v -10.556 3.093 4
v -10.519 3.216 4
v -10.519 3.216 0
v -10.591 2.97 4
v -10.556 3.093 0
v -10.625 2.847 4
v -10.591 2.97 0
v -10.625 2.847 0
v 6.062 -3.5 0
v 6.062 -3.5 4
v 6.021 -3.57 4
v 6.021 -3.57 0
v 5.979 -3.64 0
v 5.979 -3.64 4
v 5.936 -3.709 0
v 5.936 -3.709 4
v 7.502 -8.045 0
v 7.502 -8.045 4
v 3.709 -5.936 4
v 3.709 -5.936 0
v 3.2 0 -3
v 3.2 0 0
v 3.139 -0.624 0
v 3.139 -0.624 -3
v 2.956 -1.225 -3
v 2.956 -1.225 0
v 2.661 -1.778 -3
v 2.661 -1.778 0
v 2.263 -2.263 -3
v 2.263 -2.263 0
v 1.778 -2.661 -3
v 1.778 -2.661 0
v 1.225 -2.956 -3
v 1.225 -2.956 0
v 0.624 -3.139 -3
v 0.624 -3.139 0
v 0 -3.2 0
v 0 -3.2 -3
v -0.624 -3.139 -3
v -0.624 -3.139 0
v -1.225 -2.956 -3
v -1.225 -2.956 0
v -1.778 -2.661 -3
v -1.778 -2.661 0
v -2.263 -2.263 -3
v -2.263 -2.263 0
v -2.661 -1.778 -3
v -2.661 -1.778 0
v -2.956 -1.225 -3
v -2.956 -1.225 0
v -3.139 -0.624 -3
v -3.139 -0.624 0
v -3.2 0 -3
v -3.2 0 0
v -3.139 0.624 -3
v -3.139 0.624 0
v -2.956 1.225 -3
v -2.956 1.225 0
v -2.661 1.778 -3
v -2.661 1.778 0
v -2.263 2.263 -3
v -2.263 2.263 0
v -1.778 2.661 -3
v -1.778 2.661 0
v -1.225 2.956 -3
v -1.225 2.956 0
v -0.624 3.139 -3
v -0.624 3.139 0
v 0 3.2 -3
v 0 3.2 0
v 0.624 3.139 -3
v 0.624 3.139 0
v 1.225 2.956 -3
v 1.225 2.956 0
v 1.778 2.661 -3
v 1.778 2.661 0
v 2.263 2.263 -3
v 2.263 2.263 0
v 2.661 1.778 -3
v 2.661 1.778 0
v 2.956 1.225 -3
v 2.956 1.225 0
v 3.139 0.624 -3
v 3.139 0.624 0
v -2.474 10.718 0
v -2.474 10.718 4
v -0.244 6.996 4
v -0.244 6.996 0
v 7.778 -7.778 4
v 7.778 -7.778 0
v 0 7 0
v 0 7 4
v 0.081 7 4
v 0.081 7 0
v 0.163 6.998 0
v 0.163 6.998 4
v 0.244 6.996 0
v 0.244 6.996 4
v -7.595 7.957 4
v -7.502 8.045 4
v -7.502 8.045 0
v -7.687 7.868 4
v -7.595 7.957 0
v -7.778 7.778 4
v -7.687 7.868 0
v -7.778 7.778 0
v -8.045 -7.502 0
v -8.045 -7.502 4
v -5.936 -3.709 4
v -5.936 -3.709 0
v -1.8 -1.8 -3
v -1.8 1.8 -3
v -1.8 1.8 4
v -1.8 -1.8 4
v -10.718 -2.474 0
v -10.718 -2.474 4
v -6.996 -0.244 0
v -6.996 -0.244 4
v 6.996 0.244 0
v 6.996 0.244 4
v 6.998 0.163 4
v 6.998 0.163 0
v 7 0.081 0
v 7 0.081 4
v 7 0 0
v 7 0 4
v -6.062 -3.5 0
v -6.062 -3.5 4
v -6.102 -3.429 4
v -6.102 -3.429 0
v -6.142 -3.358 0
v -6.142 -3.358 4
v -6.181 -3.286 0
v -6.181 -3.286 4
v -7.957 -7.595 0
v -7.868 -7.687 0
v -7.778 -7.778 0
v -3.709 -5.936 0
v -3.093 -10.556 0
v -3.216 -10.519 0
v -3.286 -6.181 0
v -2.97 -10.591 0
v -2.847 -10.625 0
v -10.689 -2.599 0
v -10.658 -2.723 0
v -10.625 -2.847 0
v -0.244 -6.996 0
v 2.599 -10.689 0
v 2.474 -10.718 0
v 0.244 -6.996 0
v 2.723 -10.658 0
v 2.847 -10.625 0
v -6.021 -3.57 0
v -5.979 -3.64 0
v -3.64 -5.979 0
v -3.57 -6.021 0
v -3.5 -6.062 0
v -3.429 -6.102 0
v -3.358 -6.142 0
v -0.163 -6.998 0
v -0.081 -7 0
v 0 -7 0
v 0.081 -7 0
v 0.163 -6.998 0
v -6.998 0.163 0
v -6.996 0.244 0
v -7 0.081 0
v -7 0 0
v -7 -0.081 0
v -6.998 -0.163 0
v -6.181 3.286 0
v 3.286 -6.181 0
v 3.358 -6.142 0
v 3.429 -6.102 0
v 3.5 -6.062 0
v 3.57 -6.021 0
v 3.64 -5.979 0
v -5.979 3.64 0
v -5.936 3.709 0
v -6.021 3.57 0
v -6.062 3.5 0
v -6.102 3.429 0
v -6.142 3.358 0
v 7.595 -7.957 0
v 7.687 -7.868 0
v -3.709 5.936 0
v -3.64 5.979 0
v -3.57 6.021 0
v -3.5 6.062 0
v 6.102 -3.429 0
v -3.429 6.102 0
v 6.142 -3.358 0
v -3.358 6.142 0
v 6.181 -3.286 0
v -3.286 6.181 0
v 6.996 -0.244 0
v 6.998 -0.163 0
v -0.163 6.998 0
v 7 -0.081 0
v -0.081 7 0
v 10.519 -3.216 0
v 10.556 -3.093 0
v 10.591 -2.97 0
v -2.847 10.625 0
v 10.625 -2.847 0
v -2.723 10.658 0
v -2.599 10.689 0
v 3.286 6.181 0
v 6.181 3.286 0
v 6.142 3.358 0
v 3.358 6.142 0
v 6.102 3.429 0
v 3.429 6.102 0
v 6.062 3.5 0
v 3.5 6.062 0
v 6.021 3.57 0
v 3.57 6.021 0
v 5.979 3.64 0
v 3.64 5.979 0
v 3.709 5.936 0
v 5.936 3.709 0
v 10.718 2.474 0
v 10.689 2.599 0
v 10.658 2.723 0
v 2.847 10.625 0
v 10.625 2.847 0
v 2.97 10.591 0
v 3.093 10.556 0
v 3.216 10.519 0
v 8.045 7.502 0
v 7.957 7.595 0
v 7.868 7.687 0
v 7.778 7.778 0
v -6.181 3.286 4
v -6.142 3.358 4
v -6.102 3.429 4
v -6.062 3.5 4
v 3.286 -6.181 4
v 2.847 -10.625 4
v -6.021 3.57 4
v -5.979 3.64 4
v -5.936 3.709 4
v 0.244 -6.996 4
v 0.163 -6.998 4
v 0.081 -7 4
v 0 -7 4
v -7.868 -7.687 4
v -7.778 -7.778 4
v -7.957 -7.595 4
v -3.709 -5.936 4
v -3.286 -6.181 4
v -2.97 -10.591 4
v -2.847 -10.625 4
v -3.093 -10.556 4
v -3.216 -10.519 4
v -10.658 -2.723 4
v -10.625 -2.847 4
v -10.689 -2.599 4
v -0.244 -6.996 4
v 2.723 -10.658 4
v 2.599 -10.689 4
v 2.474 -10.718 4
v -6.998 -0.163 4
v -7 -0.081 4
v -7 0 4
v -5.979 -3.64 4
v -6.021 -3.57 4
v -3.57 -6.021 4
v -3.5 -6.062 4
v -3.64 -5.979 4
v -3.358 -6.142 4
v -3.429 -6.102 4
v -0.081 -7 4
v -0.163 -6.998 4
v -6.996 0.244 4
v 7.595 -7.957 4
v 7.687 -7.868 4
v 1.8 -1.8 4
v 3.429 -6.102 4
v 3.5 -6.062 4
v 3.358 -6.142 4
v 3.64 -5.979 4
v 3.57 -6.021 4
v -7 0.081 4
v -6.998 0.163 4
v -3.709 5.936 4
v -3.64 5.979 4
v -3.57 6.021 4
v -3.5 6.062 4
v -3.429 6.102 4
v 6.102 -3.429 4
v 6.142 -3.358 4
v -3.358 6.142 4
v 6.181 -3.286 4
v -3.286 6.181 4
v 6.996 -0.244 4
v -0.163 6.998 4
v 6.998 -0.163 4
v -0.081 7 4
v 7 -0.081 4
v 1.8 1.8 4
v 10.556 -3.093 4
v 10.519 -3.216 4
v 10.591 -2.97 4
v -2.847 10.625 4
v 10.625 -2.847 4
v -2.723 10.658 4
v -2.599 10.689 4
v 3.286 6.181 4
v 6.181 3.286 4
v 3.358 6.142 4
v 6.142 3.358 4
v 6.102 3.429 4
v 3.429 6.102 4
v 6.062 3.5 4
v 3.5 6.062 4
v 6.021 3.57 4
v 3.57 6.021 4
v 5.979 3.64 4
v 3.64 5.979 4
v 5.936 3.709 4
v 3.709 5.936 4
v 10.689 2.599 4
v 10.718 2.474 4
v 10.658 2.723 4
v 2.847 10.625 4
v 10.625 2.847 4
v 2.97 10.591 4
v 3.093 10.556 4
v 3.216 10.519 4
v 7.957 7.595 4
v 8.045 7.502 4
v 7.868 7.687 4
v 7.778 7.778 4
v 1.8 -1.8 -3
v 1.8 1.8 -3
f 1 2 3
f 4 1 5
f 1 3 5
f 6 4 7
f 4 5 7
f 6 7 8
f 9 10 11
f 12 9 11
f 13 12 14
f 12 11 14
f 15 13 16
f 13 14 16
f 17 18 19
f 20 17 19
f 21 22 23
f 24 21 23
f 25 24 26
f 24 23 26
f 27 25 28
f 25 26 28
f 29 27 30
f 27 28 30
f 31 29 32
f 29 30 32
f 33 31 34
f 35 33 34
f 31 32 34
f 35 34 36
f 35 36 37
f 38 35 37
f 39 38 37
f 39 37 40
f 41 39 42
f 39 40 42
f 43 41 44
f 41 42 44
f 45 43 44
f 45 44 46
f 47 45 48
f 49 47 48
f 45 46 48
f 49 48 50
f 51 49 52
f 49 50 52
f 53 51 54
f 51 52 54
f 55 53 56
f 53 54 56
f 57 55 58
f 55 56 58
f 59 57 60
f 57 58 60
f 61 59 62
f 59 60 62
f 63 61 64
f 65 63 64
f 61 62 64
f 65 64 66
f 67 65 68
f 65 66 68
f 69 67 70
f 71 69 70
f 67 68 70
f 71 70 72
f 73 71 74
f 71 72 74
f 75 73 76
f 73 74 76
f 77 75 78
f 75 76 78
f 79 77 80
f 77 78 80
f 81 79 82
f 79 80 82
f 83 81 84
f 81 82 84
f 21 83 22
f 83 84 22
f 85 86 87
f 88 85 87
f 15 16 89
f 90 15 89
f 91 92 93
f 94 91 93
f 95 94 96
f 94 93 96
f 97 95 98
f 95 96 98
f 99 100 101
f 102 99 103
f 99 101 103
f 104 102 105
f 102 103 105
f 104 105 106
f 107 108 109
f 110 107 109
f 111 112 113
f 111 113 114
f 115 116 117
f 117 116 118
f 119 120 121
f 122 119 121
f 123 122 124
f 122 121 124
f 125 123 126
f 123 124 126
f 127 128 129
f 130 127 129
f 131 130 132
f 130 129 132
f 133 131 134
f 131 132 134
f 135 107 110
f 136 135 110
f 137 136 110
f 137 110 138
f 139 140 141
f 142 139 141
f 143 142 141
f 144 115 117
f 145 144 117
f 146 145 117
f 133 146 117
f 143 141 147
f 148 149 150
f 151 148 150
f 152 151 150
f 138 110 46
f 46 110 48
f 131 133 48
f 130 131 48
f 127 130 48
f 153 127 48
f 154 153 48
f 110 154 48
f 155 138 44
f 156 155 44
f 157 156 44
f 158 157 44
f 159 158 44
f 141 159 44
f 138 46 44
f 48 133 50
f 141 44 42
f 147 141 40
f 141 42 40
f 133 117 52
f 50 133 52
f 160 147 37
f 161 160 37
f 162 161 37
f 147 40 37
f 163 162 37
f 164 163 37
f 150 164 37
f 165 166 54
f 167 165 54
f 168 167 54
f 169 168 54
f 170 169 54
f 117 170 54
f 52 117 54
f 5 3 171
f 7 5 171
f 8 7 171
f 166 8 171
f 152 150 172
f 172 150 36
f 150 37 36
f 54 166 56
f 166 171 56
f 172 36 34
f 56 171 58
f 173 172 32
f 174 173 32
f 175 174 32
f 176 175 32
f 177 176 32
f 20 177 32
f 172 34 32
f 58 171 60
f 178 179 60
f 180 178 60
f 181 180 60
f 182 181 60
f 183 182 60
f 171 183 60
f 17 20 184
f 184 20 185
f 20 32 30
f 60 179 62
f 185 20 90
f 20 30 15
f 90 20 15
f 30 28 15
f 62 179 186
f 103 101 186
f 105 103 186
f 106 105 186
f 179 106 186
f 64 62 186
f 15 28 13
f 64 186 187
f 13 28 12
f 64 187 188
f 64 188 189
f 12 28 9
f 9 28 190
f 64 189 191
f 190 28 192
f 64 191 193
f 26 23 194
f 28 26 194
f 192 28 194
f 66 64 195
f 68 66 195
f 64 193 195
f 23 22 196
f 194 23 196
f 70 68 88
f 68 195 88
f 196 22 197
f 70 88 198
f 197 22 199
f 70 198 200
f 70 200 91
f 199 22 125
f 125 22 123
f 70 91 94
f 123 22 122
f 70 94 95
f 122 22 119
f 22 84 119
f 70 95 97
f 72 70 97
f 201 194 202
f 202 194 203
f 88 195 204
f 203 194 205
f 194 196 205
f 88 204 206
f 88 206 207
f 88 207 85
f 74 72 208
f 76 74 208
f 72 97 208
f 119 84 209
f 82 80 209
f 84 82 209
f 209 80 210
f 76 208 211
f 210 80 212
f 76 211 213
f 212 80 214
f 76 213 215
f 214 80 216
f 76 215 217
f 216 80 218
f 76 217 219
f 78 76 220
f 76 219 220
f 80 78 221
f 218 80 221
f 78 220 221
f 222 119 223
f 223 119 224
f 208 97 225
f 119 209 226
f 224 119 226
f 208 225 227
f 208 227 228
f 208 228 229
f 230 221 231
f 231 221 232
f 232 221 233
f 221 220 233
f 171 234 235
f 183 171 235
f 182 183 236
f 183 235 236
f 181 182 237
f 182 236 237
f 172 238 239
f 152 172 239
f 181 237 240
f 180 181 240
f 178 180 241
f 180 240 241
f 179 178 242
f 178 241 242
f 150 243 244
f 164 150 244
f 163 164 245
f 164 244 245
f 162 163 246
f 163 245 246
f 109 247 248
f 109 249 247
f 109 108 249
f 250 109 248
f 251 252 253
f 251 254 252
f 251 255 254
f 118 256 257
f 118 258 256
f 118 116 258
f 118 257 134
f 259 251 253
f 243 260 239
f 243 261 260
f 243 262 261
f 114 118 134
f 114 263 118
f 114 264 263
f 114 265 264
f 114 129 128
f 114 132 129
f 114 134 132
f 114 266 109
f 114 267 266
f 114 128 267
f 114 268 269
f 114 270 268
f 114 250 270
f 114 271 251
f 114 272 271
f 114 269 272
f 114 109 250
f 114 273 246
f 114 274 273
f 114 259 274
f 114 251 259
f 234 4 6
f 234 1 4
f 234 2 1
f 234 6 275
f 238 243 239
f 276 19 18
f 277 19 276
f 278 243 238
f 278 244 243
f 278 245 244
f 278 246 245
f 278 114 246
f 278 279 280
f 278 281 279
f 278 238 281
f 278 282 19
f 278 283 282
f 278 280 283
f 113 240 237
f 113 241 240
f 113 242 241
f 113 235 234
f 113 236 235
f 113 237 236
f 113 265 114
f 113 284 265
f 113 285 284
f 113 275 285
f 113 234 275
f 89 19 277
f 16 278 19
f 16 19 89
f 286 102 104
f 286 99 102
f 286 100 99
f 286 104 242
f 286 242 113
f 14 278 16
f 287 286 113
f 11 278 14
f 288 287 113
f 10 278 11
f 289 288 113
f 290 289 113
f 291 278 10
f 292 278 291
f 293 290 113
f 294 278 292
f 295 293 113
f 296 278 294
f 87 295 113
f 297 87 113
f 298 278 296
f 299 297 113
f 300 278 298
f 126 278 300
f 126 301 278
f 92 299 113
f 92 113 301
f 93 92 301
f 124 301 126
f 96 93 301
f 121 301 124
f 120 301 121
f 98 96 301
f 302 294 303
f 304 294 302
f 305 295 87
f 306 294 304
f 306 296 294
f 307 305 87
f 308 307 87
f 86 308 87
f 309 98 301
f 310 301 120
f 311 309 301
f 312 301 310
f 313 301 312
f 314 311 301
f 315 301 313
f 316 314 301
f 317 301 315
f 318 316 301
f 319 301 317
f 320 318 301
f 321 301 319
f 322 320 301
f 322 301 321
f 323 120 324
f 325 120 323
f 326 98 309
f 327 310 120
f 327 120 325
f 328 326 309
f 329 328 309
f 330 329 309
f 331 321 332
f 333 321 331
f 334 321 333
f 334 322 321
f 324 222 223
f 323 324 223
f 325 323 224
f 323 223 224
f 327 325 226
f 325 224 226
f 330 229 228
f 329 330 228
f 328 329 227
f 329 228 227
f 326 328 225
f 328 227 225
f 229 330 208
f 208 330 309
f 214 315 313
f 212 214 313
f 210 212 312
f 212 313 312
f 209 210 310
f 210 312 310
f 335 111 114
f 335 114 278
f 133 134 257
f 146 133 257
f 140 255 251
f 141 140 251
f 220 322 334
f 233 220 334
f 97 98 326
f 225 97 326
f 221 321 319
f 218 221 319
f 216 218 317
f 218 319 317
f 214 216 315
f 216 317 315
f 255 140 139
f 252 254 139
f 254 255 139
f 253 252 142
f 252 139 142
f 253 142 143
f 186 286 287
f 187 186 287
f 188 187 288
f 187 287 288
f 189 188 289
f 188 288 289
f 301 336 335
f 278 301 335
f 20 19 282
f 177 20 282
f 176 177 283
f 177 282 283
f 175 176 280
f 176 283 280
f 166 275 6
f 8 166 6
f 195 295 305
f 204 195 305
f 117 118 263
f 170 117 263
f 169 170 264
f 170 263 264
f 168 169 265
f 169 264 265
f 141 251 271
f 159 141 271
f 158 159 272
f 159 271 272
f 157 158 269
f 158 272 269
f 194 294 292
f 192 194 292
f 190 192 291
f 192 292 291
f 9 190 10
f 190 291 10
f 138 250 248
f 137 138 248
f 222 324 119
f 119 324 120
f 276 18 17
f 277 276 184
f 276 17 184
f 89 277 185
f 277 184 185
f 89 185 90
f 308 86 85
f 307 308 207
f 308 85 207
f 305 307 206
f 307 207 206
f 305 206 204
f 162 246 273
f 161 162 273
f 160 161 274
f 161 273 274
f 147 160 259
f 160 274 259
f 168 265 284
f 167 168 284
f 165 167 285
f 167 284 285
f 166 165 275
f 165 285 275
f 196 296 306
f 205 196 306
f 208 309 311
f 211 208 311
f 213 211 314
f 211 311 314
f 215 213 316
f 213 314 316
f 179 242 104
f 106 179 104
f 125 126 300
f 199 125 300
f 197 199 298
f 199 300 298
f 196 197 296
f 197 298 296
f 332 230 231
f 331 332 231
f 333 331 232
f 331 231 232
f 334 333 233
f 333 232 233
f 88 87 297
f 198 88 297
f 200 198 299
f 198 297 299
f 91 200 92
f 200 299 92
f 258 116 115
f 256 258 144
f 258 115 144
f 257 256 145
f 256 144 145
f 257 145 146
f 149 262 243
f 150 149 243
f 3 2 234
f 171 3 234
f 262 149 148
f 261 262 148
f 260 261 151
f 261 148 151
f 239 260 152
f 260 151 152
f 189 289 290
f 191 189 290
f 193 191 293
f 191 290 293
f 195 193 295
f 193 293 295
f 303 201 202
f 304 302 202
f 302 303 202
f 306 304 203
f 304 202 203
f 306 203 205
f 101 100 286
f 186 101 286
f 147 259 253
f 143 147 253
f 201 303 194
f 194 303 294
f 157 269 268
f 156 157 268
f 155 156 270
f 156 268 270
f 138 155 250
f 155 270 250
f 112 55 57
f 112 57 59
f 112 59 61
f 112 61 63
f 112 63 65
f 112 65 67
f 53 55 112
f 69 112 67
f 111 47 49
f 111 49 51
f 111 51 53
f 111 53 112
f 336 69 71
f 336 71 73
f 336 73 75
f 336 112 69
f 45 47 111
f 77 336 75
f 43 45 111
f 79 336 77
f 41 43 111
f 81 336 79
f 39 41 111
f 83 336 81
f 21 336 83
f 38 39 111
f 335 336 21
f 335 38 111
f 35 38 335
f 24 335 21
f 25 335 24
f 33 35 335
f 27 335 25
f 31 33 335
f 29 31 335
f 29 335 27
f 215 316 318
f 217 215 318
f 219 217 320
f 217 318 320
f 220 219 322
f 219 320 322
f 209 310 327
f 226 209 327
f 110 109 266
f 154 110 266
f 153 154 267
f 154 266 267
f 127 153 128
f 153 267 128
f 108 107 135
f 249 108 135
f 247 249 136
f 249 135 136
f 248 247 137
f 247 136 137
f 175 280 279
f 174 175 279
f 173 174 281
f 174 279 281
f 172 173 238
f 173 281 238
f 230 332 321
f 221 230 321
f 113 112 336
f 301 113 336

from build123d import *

# Parameters (mm, degrees)
F0_R            = 11
F1_DEPTH        = 4
F3_DEPTH        = 4.001
F3_COPIES_COUNT = 12
F5_R            = 3.2
F6_DEPTH        = 3
F7_W            = 3.6
F7_H            = 3.6
F8_DEPTH        = 7.001


# Not quite as in the source:
# - a pattern or mirror of a feature is missing from the dataset's text; its kind, count and spacing are read off the source's solid


with BuildPart() as f1:
    # F0 (on Top) → F1 (new body)
    with BuildSketch(Plane.XY):
        Circle(F0_R)
    extrude(amount=F1_DEPTH)

    # F2 (on face) → F3 (cut, through all)
    with BuildSketch(Plane.XY.offset(4)):
        with BuildLine():
            Line((0, 11), (0, 7))
            ThreePointArc((0, 7), (0.1221668451, 6.9989338661), (0.2442964769, 6.9957357891))
            Line((0.2442964769, 6.9957357891), (2.8470094961, 10.6251840892))
            ThreePointArc((2.8470094961, 10.6251840892), (1.4357881144, 10.9058934751), (0, 11))
        make_face()
        with BuildLine():
            ThreePointArc((-0.2442964769, 6.9957357891), (-0.1221668451, 6.9989338661), (0, 7))
            Line((0, 7), (0, 11))
            ThreePointArc((0, 11), (-1.2452353514, 10.9292904124), (-2.4744615978, 10.7180707126))
            Line((-2.4744615978, 10.7180707126), (-0.2442964769, 6.9957357891))
        make_face()
    f3 = extrude(amount=-F3_DEPTH, mode=Mode.SUBTRACT)

    # F3_copies: F3 ×12 about axis
    f3_copies_axis = Axis((0, 0, 0), (0, 0, 1))
    for i in range(1, F3_COPIES_COUNT):
        add(f3.rotate(f3_copies_axis, i * 360 / F3_COPIES_COUNT), mode=Mode.SUBTRACT)

    # F5 (on face) → F6 (join)
    with BuildSketch(Plane(origin=(0, 0, 0), x_dir=(1, 0, 0), z_dir=(0, 0, -1))):
        Circle(F5_R)
    extrude(amount=F6_DEPTH)

    # F7 (on face) → F8 (cut, through all)
    with BuildSketch(Plane(origin=(0, 0, -3), x_dir=(1, 0, 0), z_dir=(0, 0, -1))):
        Rectangle(F7_W, F7_H)
    extrude(amount=-F8_DEPTH, mode=Mode.SUBTRACT)


solid = f1.part
